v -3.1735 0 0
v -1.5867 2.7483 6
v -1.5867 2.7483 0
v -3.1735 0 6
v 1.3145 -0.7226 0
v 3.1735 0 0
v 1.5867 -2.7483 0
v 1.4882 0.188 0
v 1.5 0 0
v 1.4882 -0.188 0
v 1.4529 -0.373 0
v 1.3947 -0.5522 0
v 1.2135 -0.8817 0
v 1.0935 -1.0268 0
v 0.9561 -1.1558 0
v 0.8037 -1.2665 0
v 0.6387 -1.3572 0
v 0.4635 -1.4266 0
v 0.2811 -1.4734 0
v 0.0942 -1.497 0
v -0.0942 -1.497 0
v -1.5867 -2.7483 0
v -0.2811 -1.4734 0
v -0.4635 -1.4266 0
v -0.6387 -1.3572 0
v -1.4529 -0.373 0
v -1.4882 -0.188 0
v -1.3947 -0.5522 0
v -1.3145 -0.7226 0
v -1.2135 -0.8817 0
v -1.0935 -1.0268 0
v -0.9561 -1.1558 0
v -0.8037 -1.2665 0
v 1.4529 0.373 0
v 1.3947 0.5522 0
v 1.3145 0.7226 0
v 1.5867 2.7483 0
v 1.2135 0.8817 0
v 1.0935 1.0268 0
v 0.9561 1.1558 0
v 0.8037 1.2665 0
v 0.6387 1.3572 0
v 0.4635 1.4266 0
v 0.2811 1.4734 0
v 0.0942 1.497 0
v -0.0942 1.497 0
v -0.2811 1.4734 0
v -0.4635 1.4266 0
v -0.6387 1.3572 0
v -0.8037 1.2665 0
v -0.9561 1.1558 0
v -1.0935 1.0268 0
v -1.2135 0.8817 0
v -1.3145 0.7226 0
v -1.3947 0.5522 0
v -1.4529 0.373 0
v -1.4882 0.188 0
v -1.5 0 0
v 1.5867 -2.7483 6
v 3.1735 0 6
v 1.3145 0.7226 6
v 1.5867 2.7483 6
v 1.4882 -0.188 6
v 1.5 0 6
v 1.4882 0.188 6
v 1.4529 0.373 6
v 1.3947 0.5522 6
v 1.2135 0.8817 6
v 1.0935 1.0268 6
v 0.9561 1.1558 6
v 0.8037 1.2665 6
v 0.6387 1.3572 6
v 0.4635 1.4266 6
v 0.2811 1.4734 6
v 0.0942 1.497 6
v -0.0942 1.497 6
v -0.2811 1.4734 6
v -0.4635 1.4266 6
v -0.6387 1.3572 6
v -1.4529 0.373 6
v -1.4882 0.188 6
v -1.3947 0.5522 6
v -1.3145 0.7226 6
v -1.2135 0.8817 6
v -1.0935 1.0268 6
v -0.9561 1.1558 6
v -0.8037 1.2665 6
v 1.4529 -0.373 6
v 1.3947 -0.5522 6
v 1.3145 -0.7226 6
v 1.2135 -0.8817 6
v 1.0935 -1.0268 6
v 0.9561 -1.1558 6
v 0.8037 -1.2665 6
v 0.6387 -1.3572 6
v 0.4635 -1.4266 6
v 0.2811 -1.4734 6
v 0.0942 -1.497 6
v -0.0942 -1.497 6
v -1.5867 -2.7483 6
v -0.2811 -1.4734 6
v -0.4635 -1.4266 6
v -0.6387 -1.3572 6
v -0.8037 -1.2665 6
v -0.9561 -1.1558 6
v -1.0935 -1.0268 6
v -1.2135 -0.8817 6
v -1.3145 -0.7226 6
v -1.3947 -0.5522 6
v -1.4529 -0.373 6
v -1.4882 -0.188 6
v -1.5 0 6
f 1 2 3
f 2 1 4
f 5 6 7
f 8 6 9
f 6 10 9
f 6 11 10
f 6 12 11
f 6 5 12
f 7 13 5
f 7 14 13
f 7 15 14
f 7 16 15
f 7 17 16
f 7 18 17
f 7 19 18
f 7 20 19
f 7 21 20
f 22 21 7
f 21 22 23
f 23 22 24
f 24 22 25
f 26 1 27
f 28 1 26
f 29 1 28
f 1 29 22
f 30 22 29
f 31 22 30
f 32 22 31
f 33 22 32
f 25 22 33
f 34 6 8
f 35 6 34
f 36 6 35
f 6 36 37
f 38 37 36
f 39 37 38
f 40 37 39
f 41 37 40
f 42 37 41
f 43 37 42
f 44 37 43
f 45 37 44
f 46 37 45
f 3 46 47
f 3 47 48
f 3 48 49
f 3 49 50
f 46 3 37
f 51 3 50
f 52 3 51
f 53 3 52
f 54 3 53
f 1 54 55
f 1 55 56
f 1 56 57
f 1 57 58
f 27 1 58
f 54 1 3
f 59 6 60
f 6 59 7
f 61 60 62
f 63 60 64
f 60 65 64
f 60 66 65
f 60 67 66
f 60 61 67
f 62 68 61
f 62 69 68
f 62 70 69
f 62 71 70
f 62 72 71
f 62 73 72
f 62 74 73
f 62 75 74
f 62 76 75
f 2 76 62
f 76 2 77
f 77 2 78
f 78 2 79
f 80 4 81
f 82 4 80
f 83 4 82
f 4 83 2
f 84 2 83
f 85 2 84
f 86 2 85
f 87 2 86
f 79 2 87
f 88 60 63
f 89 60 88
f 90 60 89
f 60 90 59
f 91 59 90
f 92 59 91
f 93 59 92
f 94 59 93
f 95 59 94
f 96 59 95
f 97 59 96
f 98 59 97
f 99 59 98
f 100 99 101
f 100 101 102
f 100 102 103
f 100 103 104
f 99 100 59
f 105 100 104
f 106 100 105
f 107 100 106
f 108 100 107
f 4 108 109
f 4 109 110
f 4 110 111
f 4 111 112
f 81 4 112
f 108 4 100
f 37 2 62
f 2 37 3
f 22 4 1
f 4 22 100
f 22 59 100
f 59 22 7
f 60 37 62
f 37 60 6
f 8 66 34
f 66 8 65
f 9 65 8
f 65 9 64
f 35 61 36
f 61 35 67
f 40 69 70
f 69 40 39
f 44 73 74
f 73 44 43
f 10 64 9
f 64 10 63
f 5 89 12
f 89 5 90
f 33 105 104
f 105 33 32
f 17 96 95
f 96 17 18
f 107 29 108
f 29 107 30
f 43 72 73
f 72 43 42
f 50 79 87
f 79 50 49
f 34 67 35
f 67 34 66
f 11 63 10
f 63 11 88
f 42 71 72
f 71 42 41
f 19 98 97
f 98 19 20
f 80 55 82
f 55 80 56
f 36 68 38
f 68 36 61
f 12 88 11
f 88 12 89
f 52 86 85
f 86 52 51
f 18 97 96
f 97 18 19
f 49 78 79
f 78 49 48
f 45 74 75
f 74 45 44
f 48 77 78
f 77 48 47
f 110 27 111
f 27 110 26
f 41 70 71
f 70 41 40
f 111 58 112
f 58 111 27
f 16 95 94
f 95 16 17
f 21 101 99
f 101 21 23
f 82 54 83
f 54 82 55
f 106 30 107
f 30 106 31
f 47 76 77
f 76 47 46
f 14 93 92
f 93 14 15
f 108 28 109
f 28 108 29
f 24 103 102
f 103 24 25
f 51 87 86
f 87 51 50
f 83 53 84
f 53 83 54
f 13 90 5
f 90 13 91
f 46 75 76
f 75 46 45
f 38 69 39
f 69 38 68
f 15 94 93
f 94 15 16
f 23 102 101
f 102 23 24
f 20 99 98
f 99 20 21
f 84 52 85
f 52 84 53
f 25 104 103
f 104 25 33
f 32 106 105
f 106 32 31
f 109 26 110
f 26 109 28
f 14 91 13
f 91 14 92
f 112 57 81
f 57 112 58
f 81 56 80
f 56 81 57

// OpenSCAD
$fn = 50;


difference() {
	union() {
		translate(v = [0, 0, 0]) {
			rotate(a = [0, 0, 0]) {
				translate(v = [0, 0, 0]) {
					rotate(a = [0, 0, 0]) {
						linear_extrude(height = 6) {
							polygon(points = [[3.1735000000, 0.0000000000], [1.5867500000, 2.7483316189], [-1.5867500000, 2.7483316189], [-3.1735000000, 0.0000000000], [-1.5867500000, -2.7483316189], [1.5867500000, -2.7483316189]]);
						}
					}
				}
			}
		}
	}
	union() {
		translate(v = [0, 0, -10]) {
			rotate(a = [0, 0, 0]) {
				cylinder(h = 100, r = 1.5000000000);
			}
		}
	}
}
